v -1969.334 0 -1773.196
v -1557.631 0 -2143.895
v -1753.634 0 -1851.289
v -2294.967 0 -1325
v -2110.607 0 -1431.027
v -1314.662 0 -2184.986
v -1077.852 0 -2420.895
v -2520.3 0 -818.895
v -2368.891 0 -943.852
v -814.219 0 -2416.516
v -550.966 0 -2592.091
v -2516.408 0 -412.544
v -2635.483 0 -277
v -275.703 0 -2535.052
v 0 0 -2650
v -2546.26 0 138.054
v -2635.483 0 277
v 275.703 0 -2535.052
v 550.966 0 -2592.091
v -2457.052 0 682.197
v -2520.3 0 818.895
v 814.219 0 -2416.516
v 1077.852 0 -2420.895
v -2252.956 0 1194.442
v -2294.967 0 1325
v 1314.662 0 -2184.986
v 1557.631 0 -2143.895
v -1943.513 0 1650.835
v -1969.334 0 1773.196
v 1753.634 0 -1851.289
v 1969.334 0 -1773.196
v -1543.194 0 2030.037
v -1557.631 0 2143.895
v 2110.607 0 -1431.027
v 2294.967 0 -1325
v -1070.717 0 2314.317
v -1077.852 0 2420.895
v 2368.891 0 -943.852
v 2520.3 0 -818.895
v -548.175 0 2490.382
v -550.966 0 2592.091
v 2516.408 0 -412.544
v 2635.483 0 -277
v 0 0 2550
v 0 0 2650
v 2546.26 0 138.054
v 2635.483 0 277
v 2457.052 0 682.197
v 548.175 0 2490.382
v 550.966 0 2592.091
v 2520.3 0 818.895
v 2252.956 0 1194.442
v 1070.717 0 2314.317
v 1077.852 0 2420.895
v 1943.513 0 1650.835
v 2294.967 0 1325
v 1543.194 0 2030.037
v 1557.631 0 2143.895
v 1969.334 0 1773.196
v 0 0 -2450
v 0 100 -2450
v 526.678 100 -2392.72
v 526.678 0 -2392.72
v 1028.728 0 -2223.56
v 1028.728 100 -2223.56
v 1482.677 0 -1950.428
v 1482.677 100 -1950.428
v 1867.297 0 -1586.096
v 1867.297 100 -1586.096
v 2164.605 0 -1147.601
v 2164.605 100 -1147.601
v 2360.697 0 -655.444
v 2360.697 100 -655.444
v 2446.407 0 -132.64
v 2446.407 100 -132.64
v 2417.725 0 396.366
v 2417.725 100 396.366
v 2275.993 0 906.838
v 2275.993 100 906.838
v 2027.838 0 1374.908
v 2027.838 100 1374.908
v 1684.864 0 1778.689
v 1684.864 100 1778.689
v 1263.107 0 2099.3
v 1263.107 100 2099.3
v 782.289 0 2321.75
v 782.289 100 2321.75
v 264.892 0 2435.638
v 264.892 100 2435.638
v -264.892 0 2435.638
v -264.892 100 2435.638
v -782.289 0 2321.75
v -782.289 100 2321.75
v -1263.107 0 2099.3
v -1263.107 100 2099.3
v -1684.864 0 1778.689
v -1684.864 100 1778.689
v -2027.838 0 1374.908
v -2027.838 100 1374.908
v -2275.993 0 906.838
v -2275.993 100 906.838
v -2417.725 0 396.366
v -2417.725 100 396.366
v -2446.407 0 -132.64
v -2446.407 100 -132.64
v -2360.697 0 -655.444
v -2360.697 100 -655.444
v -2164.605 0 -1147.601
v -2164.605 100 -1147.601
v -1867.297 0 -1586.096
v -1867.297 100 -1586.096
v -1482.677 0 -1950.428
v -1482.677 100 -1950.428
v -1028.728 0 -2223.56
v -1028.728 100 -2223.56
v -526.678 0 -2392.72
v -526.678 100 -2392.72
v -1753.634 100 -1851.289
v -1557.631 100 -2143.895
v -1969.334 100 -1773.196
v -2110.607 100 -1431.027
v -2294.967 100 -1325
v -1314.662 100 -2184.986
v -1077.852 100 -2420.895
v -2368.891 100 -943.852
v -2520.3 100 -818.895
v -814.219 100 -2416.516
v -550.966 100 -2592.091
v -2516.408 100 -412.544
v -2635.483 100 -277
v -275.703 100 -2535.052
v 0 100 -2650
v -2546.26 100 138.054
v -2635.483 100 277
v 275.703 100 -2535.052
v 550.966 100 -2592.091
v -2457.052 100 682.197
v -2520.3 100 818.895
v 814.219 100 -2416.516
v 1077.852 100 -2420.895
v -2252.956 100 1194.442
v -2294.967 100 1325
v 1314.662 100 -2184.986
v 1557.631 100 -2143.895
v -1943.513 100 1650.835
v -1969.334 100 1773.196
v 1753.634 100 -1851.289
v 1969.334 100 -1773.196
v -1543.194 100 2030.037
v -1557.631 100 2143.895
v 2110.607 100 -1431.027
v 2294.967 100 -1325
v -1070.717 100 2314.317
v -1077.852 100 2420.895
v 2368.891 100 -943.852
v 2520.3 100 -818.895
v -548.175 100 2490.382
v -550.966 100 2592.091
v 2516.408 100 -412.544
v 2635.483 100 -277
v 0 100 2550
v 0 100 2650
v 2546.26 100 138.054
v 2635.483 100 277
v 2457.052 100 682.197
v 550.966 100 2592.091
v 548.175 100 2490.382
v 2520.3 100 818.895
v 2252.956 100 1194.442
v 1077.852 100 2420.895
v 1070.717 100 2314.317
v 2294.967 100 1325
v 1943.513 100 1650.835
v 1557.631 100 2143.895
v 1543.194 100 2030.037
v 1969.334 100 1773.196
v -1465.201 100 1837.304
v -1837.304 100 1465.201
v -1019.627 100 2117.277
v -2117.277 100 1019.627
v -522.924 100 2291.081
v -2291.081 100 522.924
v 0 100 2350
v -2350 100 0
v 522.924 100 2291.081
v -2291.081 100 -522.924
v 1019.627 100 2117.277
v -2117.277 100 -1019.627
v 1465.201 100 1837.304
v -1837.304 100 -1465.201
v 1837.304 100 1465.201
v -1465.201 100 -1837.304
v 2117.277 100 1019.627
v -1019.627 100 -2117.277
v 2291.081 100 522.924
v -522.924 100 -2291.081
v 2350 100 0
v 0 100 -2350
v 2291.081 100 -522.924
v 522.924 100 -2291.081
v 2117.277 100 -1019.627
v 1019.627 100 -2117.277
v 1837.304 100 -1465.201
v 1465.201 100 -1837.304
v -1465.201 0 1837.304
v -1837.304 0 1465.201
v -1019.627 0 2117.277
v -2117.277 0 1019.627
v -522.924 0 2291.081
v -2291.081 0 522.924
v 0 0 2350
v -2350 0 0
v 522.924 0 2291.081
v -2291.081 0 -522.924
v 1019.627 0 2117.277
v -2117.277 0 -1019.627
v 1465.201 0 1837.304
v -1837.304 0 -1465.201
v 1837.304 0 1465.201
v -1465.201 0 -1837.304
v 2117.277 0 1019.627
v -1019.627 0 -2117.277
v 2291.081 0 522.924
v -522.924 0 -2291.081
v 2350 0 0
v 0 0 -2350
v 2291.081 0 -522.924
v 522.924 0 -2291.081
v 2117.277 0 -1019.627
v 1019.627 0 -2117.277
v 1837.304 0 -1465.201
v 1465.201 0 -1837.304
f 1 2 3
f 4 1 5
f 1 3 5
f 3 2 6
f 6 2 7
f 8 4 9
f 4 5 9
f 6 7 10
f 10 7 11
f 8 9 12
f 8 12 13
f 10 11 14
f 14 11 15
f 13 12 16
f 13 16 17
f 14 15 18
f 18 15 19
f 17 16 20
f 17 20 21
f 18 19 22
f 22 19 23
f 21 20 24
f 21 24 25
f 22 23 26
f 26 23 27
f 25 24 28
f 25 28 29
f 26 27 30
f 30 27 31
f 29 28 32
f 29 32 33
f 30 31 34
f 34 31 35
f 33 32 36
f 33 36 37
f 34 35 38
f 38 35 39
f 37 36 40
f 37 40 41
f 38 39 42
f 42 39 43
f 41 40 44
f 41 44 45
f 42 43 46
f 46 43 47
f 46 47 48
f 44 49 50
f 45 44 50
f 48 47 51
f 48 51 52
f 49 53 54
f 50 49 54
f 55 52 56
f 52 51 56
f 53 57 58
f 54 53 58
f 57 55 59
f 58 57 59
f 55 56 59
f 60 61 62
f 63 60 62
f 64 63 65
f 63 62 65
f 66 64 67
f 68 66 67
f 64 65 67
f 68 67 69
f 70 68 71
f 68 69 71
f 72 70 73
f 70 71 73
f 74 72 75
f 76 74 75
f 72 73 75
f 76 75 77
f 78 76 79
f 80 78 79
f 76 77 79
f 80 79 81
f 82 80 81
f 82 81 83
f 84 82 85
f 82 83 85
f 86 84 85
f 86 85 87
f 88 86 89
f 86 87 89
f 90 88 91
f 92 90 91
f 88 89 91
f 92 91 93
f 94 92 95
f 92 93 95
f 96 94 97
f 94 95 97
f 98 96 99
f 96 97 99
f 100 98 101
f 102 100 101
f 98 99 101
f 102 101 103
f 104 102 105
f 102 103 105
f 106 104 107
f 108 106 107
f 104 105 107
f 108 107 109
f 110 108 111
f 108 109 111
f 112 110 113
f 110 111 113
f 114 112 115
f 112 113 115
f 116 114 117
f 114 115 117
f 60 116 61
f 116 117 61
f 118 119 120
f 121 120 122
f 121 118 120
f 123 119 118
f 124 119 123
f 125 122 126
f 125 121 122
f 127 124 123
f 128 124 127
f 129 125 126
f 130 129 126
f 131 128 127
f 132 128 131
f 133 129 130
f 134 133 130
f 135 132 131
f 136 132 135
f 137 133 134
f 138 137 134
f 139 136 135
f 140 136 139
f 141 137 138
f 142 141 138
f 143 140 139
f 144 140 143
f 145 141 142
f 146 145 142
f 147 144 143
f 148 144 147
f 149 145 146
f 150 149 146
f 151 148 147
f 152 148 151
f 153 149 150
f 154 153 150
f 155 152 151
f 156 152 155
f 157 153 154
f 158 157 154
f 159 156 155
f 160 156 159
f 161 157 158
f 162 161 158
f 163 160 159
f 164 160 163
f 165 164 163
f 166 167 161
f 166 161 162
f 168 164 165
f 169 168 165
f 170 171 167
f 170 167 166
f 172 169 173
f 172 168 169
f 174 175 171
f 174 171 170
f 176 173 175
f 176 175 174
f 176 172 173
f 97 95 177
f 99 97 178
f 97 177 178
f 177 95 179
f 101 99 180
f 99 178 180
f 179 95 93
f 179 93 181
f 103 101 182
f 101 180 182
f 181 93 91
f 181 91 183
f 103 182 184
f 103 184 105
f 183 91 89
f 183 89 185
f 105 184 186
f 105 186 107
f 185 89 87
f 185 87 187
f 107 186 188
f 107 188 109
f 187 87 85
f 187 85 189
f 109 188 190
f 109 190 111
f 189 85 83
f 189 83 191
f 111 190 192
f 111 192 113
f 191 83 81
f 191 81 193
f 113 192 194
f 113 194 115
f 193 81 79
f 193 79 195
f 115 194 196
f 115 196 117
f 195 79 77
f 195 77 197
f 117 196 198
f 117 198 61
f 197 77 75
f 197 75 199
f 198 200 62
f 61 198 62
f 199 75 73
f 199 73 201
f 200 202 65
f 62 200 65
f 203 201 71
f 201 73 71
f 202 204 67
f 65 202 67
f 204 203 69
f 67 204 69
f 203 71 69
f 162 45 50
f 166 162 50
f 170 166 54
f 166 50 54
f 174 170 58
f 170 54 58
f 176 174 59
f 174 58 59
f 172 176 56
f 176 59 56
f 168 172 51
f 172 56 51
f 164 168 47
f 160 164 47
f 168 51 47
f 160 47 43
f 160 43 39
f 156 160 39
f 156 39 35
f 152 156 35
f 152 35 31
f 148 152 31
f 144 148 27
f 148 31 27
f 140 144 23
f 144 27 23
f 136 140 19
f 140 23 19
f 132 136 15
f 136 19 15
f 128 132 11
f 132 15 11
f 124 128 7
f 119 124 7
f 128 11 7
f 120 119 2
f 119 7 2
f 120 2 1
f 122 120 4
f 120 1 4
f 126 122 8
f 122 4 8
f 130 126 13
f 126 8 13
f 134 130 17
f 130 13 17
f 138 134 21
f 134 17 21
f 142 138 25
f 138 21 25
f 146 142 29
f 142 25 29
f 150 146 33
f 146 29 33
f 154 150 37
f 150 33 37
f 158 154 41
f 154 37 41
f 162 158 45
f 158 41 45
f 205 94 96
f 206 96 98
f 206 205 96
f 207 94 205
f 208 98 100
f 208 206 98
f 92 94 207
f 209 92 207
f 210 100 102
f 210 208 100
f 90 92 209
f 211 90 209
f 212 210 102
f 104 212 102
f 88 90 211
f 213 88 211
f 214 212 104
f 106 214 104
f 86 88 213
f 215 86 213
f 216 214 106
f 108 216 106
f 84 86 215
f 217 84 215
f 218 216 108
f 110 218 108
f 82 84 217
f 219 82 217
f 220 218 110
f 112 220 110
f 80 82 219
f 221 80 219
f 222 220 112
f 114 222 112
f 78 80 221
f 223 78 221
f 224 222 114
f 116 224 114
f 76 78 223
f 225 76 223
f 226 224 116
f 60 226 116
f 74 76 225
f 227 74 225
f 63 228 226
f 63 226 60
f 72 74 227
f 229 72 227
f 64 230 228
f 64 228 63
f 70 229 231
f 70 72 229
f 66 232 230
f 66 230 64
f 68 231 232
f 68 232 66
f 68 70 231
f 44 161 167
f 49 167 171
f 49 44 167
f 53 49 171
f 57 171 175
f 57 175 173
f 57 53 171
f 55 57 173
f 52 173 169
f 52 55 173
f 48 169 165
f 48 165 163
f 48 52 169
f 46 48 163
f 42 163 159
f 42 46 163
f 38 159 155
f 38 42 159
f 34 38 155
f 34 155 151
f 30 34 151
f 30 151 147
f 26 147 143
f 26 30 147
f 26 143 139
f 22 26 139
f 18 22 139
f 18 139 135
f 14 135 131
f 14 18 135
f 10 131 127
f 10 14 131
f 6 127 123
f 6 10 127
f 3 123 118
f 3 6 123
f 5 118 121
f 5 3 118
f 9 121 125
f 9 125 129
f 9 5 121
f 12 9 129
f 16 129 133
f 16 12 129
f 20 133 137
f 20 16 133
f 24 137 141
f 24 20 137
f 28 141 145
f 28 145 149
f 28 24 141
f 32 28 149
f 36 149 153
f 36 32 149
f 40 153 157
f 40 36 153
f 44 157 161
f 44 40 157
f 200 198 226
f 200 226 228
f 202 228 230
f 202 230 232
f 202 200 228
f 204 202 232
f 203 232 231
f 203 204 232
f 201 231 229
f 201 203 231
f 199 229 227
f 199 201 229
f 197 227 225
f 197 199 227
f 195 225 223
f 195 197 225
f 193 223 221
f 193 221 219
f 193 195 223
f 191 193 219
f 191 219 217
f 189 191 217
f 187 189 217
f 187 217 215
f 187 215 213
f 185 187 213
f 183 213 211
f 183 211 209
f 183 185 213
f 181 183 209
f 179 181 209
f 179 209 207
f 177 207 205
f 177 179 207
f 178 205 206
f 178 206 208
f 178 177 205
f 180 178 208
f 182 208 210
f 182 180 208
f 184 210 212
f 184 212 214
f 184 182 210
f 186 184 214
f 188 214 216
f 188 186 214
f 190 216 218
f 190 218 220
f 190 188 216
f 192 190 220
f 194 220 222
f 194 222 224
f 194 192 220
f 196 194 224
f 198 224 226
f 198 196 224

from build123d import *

# Parameters (mm, degrees)
SKETCH_2_R      = 2650
SKETCH_2_R_2    = 2550
EXTRUDE_1_DEPTH = 100
EXTRUDE_START   = -100
SKETCH_4_R      = 2450
SKETCH_4_R_2    = 2350
EXTRUDE_3_DEPTH = 100


with BuildPart() as part:
    # ｽｹｯﾁ2 → ﾎﾞｽ - 押し出し1 (new body)
    with BuildSketch(Plane(origin=(0, 0, 0), x_dir=(1, 0, 0), z_dir=(0, 1, 0))):
        with Locations(Location((0, 0, 0), (0, 0, 270))):
            Circle(SKETCH_2_R)
        with Locations(Location((0, 0, 0), (0, 0, 270))):
            Circle(SKETCH_2_R_2, mode=Mode.SUBTRACT)
    extrude(amount=EXTRUDE_1_DEPTH)


with BuildPart() as body_2:
    # ｽｹｯﾁ4 → ﾎﾞｽ - 押し出し3 (new body)
    with BuildSketch(Plane(origin=(0, 0, 0), x_dir=(-1, 0, 0), z_dir=(0, -1, 0)).offset(EXTRUDE_START)):
        with Locations(Location((0, 0, 0), (0, 0, 90))):
            Circle(SKETCH_4_R)
        with Locations(Location((0, 0, 0), (0, 0, 90))):
            Circle(SKETCH_4_R_2, mode=Mode.SUBTRACT)
    extrude(amount=EXTRUDE_3_DEPTH)


solid = Compound([part.part, body_2.part])
